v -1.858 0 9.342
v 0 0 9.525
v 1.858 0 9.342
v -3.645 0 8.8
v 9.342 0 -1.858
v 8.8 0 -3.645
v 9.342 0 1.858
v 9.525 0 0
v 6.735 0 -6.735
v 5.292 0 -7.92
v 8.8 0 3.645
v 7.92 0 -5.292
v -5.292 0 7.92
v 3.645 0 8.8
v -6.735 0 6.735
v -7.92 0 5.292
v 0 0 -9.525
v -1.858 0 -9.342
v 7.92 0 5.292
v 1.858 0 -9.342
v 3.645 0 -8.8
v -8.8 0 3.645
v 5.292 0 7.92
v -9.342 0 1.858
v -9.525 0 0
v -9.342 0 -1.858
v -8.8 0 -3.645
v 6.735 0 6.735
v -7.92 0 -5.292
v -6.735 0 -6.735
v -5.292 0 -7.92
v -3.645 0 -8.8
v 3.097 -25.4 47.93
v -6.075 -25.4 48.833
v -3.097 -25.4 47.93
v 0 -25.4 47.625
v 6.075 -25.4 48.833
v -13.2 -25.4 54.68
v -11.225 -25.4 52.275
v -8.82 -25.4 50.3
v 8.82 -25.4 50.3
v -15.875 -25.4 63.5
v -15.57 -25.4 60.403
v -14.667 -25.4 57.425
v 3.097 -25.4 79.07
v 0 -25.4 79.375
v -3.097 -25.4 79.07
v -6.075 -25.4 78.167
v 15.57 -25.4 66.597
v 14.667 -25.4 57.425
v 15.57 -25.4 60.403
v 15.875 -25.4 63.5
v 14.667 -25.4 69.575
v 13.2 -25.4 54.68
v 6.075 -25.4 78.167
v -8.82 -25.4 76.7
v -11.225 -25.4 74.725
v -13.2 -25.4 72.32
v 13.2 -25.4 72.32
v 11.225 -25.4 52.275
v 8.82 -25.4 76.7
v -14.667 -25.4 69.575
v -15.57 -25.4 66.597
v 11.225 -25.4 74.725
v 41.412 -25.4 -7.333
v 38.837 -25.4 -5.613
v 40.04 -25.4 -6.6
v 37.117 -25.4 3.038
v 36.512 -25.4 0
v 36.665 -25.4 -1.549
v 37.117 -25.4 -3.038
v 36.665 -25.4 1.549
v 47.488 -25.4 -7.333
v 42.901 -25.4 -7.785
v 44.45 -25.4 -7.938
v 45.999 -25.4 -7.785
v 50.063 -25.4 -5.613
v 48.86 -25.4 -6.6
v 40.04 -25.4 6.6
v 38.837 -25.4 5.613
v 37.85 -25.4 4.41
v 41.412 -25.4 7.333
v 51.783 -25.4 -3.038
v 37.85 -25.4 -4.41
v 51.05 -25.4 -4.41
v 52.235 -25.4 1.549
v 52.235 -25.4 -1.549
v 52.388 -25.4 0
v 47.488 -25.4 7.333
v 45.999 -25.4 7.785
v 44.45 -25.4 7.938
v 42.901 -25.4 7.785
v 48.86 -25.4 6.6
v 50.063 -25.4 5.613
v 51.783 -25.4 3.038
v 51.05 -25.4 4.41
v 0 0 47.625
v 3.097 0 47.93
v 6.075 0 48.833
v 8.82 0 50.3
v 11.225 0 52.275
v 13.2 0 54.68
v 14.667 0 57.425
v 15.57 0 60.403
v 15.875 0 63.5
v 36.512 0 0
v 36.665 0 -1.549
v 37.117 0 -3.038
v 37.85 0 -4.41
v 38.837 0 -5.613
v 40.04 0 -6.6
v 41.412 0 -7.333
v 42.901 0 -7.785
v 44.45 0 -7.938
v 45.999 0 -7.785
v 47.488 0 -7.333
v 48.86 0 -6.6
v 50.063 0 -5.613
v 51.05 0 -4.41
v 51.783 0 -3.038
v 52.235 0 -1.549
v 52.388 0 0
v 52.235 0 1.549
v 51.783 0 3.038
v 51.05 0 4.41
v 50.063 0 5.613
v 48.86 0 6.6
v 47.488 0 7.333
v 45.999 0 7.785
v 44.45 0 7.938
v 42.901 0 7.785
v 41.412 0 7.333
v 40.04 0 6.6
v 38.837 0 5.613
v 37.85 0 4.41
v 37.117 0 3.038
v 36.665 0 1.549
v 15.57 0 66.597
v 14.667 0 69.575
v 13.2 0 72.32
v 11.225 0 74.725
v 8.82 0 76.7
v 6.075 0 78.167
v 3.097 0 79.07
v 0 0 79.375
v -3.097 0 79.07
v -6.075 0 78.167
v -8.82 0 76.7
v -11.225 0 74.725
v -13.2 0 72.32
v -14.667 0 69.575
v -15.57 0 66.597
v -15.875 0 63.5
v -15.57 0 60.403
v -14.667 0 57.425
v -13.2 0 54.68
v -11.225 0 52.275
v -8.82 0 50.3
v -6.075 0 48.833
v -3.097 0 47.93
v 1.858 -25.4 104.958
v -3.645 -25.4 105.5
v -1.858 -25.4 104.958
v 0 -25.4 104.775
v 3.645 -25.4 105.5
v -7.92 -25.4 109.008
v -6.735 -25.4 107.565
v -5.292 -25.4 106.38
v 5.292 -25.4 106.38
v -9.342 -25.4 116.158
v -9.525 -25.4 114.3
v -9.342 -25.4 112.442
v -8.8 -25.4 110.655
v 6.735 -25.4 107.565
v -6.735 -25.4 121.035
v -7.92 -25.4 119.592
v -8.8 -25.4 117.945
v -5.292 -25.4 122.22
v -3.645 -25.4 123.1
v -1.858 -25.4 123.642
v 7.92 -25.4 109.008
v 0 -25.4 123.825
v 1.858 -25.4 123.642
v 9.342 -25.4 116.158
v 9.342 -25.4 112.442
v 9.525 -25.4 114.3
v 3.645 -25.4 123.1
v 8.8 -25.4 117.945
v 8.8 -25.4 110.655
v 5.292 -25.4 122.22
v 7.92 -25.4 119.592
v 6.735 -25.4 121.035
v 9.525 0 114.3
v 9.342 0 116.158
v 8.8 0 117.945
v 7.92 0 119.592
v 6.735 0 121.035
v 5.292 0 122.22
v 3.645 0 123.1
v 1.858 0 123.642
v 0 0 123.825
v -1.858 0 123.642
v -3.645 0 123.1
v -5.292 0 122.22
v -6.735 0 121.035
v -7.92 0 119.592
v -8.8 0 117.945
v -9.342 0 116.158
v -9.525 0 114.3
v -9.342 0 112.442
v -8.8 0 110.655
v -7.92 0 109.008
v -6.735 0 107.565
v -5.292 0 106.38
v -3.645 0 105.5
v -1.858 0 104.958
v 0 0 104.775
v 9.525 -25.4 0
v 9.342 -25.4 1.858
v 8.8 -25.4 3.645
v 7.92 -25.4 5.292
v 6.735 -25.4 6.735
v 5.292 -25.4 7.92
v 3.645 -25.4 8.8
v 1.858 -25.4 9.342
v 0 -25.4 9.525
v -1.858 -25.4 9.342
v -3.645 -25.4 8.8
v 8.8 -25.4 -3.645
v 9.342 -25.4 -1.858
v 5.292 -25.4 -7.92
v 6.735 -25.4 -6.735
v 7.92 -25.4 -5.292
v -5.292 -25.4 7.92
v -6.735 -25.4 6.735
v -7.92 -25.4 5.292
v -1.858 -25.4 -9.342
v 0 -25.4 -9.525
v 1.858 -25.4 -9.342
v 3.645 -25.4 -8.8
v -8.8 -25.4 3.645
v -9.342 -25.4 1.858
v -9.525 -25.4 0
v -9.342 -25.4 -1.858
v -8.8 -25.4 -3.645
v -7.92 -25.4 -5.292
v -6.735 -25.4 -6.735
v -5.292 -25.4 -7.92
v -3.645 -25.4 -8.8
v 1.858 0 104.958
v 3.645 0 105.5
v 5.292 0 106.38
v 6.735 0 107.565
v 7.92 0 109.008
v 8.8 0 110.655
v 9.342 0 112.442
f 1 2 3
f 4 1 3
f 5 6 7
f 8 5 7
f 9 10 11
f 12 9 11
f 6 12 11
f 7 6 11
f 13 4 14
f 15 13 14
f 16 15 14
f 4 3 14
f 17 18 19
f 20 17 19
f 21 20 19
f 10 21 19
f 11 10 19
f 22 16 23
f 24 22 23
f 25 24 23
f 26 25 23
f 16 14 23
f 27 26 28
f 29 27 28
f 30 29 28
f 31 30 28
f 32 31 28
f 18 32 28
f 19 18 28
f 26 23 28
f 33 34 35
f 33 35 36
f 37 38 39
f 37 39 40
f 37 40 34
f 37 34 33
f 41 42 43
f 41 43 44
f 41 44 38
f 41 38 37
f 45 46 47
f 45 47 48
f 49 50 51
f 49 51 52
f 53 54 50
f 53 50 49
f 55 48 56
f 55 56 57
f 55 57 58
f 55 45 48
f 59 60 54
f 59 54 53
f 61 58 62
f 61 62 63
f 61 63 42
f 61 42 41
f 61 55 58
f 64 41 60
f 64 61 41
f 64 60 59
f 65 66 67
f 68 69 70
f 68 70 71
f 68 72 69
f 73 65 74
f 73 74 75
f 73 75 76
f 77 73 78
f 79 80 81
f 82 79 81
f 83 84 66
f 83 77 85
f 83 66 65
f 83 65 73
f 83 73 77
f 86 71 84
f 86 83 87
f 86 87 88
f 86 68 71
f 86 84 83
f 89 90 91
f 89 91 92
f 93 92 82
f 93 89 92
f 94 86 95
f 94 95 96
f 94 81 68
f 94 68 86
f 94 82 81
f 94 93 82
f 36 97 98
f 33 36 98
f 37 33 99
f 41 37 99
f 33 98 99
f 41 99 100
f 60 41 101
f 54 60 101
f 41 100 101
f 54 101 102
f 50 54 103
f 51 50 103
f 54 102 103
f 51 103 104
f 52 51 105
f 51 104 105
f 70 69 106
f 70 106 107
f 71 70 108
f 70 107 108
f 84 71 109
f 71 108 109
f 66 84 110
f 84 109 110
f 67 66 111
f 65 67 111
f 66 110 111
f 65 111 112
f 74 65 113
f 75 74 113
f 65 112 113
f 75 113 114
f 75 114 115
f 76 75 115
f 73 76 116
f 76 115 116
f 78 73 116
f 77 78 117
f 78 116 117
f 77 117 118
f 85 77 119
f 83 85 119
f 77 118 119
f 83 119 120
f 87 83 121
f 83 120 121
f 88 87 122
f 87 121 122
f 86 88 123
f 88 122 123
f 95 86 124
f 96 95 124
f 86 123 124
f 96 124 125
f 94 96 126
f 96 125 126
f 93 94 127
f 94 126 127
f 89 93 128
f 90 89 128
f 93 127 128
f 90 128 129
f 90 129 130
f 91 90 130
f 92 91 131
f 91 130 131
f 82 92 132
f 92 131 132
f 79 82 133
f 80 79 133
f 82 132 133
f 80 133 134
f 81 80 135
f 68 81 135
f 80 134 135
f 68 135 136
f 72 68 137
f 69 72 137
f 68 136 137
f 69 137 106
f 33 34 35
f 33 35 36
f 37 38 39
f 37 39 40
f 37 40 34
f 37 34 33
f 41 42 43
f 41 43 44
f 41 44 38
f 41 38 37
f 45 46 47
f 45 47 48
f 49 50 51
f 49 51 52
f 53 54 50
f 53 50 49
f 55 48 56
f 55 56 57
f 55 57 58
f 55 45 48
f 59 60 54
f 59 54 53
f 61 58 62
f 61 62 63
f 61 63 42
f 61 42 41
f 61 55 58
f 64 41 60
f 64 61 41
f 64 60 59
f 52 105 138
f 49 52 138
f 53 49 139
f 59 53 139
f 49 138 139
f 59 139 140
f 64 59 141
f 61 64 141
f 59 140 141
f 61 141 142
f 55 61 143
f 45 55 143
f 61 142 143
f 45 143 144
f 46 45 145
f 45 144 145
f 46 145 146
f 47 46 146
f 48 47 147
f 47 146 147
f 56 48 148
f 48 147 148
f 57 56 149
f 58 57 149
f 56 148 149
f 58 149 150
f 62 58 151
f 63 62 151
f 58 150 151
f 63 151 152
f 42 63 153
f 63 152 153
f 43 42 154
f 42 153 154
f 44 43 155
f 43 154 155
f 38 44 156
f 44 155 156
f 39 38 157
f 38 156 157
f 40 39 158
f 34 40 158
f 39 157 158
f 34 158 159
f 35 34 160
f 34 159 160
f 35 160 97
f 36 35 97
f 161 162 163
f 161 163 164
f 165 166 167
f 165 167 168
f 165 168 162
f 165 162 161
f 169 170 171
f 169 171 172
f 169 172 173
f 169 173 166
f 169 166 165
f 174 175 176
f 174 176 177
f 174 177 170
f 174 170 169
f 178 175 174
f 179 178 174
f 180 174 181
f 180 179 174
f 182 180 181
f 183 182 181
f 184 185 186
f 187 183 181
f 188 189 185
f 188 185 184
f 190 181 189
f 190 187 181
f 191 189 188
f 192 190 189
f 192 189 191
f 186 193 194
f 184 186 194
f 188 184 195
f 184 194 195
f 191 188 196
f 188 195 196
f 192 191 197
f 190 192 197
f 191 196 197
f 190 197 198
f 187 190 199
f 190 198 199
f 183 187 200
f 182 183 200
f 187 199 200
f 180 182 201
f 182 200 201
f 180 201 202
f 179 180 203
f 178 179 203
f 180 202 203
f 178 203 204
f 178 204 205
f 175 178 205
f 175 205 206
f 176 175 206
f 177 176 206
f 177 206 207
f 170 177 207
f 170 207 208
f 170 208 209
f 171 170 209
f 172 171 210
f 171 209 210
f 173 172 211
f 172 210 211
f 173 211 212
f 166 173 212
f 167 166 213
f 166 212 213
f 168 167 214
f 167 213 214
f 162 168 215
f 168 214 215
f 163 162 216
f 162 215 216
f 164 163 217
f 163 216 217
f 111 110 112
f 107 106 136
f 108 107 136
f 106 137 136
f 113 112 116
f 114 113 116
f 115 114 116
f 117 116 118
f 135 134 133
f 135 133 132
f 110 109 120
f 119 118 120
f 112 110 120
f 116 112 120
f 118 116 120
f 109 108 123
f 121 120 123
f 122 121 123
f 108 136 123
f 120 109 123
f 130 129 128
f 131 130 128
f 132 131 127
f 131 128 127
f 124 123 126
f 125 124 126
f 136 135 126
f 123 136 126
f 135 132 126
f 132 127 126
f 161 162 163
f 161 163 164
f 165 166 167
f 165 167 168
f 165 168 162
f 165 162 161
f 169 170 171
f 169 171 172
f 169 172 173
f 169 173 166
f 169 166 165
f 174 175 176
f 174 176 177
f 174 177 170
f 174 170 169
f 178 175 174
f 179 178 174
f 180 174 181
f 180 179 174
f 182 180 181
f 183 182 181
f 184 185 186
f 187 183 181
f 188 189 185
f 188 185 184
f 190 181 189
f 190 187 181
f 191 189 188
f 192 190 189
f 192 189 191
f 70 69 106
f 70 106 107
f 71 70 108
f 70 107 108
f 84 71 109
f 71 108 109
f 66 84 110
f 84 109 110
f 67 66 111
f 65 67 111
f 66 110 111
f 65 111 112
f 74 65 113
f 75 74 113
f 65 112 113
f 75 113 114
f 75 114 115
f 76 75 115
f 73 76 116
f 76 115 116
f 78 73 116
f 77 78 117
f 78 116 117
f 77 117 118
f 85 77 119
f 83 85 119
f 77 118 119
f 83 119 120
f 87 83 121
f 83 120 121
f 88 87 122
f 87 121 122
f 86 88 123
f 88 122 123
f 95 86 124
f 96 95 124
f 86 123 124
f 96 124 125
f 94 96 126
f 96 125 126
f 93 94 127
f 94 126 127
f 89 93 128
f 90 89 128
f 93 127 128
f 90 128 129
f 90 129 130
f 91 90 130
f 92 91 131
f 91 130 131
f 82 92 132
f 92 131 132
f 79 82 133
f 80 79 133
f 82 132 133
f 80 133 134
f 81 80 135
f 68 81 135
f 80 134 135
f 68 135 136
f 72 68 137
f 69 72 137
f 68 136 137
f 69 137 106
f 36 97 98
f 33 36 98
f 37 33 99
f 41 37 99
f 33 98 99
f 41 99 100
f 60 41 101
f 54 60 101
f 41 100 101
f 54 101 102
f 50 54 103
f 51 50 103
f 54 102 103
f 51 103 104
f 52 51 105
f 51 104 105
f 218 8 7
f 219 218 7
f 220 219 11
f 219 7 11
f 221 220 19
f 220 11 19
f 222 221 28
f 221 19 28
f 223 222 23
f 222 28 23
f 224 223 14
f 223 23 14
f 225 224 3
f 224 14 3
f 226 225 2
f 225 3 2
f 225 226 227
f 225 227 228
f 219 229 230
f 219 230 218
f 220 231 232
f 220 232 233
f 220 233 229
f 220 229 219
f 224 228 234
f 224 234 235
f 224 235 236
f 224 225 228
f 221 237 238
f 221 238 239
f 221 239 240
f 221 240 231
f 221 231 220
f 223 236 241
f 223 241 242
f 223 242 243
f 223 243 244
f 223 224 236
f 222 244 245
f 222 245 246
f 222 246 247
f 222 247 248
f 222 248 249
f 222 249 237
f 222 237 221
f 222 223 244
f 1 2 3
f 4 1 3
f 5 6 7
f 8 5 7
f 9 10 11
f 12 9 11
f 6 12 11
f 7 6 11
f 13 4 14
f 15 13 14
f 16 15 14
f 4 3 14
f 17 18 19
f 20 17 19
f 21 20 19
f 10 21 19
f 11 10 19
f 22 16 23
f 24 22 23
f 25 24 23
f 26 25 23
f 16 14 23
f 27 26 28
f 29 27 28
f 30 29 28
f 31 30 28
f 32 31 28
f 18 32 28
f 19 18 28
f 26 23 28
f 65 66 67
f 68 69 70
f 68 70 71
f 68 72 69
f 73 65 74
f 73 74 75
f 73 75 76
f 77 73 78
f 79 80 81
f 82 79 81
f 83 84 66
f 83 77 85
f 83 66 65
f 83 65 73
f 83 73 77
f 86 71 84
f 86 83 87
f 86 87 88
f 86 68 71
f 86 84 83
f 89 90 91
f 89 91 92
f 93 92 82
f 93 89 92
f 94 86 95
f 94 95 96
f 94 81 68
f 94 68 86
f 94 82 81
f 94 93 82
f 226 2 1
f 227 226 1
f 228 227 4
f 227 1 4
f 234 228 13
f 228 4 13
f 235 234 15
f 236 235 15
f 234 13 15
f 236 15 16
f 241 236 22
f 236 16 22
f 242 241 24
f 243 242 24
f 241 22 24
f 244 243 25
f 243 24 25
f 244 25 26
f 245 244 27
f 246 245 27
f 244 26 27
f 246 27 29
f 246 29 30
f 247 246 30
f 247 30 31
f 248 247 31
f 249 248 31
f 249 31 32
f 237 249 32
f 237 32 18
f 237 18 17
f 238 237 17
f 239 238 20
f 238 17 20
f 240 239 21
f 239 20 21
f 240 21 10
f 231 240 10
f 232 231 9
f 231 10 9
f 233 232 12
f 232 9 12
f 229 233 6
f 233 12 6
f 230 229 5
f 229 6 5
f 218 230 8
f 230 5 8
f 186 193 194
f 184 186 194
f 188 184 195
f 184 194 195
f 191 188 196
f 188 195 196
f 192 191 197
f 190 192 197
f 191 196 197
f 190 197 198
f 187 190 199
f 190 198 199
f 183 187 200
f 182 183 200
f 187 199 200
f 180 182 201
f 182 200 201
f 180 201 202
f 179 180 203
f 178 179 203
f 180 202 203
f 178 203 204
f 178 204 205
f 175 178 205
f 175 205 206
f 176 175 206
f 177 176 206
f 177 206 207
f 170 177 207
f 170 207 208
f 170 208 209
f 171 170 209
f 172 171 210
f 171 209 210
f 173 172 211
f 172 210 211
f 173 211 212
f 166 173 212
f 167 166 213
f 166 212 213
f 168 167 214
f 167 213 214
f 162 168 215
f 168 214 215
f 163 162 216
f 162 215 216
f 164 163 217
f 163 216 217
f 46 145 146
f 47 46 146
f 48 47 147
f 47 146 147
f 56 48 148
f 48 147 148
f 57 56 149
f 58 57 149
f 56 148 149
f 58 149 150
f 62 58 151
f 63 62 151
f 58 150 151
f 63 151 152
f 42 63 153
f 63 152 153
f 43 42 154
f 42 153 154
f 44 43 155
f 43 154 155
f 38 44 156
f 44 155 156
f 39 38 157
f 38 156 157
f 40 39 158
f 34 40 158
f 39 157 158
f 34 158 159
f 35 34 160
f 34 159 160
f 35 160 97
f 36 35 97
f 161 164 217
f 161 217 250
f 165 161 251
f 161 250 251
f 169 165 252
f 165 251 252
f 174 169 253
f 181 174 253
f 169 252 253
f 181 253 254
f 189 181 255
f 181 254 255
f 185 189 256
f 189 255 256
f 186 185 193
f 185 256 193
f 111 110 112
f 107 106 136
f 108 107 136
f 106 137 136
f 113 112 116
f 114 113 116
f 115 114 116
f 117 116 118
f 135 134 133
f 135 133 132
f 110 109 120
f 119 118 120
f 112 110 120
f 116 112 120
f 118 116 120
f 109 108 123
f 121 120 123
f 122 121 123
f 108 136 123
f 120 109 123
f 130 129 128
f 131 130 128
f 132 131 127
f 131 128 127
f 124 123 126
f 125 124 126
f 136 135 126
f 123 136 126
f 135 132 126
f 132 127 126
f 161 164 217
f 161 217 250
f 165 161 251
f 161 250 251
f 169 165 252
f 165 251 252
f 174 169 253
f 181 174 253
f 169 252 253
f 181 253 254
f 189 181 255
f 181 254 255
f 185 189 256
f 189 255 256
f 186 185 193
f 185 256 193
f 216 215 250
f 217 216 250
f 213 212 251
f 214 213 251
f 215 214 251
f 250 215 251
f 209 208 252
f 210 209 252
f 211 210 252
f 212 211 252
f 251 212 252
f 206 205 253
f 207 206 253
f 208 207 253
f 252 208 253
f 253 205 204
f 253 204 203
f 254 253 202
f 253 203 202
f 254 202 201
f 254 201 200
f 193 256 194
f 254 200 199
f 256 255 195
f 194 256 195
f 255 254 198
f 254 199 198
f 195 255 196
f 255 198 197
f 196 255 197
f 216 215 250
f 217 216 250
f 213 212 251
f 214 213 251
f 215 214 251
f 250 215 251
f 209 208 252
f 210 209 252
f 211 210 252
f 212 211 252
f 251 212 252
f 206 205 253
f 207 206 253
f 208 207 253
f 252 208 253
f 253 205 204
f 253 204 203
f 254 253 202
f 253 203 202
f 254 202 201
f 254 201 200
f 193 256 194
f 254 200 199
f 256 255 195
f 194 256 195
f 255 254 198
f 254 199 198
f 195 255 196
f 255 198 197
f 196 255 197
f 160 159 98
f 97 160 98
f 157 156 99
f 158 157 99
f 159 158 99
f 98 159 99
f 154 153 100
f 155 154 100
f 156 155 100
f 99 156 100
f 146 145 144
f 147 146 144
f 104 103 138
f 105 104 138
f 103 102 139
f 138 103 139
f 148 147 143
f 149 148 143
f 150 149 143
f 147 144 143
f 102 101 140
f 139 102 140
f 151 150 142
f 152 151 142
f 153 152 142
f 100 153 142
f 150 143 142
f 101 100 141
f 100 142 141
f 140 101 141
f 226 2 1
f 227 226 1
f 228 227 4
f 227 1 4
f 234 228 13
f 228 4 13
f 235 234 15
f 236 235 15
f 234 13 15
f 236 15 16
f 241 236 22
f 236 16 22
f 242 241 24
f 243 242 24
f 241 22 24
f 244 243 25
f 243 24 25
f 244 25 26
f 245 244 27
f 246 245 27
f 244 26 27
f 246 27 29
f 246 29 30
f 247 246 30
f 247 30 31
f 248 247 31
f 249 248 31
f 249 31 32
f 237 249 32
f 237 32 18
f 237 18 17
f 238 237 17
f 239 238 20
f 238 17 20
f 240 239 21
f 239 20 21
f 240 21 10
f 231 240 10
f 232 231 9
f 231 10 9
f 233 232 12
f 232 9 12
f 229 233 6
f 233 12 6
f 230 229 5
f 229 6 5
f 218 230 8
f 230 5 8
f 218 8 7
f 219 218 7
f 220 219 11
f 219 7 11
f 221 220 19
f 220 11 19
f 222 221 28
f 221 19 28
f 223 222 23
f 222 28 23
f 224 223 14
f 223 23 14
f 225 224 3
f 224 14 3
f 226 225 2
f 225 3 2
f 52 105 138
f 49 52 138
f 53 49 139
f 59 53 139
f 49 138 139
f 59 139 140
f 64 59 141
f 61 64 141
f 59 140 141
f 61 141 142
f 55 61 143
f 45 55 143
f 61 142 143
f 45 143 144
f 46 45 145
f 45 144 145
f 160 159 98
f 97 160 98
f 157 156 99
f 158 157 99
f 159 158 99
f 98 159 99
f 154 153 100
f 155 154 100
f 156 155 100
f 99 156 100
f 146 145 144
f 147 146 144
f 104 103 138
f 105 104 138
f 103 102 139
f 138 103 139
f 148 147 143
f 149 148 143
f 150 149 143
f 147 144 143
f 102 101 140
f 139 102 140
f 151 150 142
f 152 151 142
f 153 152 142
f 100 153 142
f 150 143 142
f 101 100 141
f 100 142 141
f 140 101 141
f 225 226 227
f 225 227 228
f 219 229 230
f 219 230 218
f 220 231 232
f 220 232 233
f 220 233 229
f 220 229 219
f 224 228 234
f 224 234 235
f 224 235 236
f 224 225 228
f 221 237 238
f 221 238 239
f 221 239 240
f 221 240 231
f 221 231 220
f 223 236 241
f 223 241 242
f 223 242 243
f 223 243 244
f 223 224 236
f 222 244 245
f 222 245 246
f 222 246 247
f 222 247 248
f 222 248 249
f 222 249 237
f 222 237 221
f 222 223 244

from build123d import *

# Parameters (mm, degrees)
F1_DEPTH = 25.4
F2_DEPTH = 25.4


with BuildPart() as f1:
    # F0 (on Front) → F1 (new body)
    with BuildSketch(Plane.XZ):
        with BuildLine():
            ThreePointArc((9.525, 114.3), (-6.735192, 121.035192), (0, 104.775))
            ThreePointArc((0, 104.775), (6.735192, 107.564808), (9.525, 114.3))
        make_face()
        with BuildLine():
            ThreePointArc((0, 79.375), (-15.875, 63.5), (0, 47.625))
            Line((0, 47.625), (0, 63.5))
            Line((0, 63.5), (0, 79.375))
        make_face()
        with BuildLine():
            Line((0, 63.5), (0, 47.625))
            ThreePointArc((0, 47.625), (11.22532, 52.27468), (15.875, 63.5))
            ThreePointArc((15.875, 63.5), (11.22532, 74.72532), (0, 79.375))
            Line((0, 79.375), (0, 63.5))
        make_face()
        with BuildLine():
            ThreePointArc((52.3875, 0), (44.45, 7.9375), (36.5125, 0))
            ThreePointArc((36.5125, 0), (44.45, -7.9375), (52.3875, 0))
        make_face()
        with BuildLine():
            ThreePointArc((9.525, 0), (6.735192, 6.735192), (0, 9.525))
            Line((0, 9.525), (0, 0))
            Line((0, 0), (9.525, 0))
        make_face()
        with BuildLine():
            Line((0, 0), (0, 9.525))
            ThreePointArc((0, 9.525), (-6.735192, -6.735192), (9.525, 0))
            Line((9.525, 0), (0, 0))
        make_face()
    extrude(amount=F1_DEPTH)


with BuildPart() as f2:
    # F0 (on Front) → F2 (new body)
    with BuildSketch(Plane.XZ):
        with BuildLine():
            ThreePointArc((9.525, 114.3), (-6.735192, 121.035192), (0, 104.775))
            ThreePointArc((0, 104.775), (6.735192, 107.564808), (9.525, 114.3))
        make_face()
        with BuildLine():
            ThreePointArc((0, 79.375), (-15.875, 63.5), (0, 47.625))
            Line((0, 47.625), (0, 63.5))
            Line((0, 63.5), (0, 79.375))
        make_face()
        with BuildLine():
            Line((0, 63.5), (0, 47.625))
            ThreePointArc((0, 47.625), (11.22532, 52.27468), (15.875, 63.5))
            ThreePointArc((15.875, 63.5), (11.22532, 74.72532), (0, 79.375))
            Line((0, 79.375), (0, 63.5))
        make_face()
        with BuildLine():
            ThreePointArc((52.3875, 0), (44.45, 7.9375), (36.5125, 0))
            ThreePointArc((36.5125, 0), (44.45, -7.9375), (52.3875, 0))
        make_face()
        with BuildLine():
            ThreePointArc((9.525, 0), (6.735192, 6.735192), (0, 9.525))
            Line((0, 9.525), (0, 0))
            Line((0, 0), (9.525, 0))
        make_face()
        with BuildLine():
            Line((0, 0), (0, 9.525))
            ThreePointArc((0, 9.525), (-6.735192, -6.735192), (9.525, 0))
            Line((9.525, 0), (0, 0))
        make_face()
    extrude(amount=F2_DEPTH)


solid = Compound([f1.part, f2.part])
